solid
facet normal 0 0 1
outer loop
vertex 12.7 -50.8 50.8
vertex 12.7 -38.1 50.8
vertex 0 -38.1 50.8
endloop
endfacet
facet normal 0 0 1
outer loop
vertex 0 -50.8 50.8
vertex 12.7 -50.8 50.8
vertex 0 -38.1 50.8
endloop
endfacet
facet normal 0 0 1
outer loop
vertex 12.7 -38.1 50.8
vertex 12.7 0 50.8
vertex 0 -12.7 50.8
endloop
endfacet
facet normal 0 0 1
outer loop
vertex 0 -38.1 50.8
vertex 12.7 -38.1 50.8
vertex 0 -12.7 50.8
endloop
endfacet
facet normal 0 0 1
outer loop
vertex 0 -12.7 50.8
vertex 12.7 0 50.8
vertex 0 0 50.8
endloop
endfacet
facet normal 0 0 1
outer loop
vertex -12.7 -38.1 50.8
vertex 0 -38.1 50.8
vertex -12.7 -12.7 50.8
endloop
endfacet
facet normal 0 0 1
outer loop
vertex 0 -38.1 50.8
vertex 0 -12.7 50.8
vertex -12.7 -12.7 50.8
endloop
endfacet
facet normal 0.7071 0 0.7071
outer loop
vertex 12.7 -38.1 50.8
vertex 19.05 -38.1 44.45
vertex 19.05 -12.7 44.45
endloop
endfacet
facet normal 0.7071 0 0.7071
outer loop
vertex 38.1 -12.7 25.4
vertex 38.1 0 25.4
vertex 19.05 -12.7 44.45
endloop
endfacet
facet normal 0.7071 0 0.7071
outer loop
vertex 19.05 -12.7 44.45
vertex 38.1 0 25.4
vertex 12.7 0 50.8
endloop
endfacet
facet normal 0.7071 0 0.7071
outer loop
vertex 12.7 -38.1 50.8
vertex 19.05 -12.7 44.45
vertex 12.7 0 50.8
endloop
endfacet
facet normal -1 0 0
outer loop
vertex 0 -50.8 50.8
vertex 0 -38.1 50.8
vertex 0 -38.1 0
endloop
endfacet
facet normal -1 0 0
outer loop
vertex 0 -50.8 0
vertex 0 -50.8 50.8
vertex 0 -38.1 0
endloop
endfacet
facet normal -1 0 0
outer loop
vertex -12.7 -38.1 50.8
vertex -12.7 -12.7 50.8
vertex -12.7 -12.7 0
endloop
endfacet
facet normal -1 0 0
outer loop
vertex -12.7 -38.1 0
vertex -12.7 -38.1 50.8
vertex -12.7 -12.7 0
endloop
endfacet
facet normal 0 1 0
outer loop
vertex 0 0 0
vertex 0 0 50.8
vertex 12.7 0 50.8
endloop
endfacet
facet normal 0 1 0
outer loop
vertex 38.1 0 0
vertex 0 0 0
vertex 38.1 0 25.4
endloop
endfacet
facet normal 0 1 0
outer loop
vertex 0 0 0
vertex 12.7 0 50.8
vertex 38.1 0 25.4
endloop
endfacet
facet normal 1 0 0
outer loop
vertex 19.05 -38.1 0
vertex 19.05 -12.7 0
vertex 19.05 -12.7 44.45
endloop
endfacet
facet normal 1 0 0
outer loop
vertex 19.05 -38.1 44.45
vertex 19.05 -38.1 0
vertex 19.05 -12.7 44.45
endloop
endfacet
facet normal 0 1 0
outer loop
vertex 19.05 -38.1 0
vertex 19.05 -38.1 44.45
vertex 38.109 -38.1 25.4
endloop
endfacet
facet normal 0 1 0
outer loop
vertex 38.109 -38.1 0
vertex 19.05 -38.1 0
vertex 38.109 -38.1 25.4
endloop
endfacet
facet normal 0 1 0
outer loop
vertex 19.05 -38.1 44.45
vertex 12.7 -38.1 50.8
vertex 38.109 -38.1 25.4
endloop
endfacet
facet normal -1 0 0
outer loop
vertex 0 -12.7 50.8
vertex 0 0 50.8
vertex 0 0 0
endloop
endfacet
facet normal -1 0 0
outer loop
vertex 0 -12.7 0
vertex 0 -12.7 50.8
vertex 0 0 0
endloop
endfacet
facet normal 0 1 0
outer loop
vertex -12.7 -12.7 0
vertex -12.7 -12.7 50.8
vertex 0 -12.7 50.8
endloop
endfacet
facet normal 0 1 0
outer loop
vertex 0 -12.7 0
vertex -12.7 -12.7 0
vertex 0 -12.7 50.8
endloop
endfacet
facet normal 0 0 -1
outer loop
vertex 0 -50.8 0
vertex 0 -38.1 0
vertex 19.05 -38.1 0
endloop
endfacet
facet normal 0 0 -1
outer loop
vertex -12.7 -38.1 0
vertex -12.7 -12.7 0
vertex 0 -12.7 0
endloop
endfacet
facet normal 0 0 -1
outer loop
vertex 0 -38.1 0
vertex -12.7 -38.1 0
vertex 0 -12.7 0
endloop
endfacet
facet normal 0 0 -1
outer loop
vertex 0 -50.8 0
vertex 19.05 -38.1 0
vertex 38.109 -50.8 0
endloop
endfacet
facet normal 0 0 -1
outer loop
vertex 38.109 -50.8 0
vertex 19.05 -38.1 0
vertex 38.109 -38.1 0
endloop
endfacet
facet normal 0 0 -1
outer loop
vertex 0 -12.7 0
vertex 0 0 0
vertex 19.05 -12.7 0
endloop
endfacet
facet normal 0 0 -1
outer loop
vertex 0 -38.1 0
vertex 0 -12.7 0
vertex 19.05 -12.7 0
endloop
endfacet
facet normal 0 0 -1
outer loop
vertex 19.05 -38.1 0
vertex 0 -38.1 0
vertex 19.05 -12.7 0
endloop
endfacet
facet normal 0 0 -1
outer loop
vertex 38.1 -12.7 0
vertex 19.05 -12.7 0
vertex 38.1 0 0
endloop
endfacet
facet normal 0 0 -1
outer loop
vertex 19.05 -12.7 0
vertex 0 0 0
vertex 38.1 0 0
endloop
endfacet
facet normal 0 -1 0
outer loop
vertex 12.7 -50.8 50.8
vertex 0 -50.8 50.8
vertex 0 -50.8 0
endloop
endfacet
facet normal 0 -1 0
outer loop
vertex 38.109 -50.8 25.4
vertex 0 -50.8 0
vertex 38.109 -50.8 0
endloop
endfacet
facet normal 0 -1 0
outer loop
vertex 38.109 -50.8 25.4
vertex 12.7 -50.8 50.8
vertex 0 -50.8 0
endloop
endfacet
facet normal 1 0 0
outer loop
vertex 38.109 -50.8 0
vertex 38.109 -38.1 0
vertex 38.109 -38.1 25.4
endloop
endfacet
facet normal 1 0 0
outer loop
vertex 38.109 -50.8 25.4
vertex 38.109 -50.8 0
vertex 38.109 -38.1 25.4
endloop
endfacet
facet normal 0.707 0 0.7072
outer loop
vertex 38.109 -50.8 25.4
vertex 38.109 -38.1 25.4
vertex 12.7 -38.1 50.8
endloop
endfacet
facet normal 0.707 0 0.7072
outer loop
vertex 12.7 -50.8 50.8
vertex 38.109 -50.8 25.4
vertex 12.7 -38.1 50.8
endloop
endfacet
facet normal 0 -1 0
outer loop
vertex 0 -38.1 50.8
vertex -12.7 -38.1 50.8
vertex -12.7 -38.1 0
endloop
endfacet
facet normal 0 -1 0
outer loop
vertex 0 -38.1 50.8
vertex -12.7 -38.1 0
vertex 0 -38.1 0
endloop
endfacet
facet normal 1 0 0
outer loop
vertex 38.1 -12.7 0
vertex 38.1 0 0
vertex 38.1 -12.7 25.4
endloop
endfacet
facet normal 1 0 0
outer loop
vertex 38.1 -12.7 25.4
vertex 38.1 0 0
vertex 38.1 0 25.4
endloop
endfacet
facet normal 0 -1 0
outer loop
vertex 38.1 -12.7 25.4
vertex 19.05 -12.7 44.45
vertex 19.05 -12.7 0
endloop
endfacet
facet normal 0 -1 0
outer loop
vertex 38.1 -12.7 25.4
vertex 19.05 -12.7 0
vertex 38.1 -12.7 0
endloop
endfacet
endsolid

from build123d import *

# Parameters (mm, degrees)
F1_DEPTH = 12.7
F3_DEPTH = 25.4
F5_DEPTH = 12.7


with BuildPart() as f1:
    # F0 (on Front) → F1 (new body)
    with BuildSketch(Plane.XZ):
        Polygon((0, 50.8), (0, 0), (38.1, 0), (38.1, 25.4), (12.7, 50.8), align=None)
    extrude(amount=F1_DEPTH)

    # F2 (on face) → F3 (join)
    with BuildSketch(Plane.XZ.offset(12.7)):
        Polygon((-12.7, 0), (0, 0), (19.05, 0), (19.05, 44.45), (12.7, 50.8), (0, 50.8), (-12.7, 50.8), align=None)
    extrude(amount=F3_DEPTH)

    # F4 (on face) → F5 (join)
    with BuildSketch(Plane.XZ.offset(38.1)):
        Polygon((0, 50.8), (0, 0), (38.109031, 0), (38.109031, 25.4), (12.7, 50.8), align=None)
    extrude(amount=F5_DEPTH)


solid = f1.part
